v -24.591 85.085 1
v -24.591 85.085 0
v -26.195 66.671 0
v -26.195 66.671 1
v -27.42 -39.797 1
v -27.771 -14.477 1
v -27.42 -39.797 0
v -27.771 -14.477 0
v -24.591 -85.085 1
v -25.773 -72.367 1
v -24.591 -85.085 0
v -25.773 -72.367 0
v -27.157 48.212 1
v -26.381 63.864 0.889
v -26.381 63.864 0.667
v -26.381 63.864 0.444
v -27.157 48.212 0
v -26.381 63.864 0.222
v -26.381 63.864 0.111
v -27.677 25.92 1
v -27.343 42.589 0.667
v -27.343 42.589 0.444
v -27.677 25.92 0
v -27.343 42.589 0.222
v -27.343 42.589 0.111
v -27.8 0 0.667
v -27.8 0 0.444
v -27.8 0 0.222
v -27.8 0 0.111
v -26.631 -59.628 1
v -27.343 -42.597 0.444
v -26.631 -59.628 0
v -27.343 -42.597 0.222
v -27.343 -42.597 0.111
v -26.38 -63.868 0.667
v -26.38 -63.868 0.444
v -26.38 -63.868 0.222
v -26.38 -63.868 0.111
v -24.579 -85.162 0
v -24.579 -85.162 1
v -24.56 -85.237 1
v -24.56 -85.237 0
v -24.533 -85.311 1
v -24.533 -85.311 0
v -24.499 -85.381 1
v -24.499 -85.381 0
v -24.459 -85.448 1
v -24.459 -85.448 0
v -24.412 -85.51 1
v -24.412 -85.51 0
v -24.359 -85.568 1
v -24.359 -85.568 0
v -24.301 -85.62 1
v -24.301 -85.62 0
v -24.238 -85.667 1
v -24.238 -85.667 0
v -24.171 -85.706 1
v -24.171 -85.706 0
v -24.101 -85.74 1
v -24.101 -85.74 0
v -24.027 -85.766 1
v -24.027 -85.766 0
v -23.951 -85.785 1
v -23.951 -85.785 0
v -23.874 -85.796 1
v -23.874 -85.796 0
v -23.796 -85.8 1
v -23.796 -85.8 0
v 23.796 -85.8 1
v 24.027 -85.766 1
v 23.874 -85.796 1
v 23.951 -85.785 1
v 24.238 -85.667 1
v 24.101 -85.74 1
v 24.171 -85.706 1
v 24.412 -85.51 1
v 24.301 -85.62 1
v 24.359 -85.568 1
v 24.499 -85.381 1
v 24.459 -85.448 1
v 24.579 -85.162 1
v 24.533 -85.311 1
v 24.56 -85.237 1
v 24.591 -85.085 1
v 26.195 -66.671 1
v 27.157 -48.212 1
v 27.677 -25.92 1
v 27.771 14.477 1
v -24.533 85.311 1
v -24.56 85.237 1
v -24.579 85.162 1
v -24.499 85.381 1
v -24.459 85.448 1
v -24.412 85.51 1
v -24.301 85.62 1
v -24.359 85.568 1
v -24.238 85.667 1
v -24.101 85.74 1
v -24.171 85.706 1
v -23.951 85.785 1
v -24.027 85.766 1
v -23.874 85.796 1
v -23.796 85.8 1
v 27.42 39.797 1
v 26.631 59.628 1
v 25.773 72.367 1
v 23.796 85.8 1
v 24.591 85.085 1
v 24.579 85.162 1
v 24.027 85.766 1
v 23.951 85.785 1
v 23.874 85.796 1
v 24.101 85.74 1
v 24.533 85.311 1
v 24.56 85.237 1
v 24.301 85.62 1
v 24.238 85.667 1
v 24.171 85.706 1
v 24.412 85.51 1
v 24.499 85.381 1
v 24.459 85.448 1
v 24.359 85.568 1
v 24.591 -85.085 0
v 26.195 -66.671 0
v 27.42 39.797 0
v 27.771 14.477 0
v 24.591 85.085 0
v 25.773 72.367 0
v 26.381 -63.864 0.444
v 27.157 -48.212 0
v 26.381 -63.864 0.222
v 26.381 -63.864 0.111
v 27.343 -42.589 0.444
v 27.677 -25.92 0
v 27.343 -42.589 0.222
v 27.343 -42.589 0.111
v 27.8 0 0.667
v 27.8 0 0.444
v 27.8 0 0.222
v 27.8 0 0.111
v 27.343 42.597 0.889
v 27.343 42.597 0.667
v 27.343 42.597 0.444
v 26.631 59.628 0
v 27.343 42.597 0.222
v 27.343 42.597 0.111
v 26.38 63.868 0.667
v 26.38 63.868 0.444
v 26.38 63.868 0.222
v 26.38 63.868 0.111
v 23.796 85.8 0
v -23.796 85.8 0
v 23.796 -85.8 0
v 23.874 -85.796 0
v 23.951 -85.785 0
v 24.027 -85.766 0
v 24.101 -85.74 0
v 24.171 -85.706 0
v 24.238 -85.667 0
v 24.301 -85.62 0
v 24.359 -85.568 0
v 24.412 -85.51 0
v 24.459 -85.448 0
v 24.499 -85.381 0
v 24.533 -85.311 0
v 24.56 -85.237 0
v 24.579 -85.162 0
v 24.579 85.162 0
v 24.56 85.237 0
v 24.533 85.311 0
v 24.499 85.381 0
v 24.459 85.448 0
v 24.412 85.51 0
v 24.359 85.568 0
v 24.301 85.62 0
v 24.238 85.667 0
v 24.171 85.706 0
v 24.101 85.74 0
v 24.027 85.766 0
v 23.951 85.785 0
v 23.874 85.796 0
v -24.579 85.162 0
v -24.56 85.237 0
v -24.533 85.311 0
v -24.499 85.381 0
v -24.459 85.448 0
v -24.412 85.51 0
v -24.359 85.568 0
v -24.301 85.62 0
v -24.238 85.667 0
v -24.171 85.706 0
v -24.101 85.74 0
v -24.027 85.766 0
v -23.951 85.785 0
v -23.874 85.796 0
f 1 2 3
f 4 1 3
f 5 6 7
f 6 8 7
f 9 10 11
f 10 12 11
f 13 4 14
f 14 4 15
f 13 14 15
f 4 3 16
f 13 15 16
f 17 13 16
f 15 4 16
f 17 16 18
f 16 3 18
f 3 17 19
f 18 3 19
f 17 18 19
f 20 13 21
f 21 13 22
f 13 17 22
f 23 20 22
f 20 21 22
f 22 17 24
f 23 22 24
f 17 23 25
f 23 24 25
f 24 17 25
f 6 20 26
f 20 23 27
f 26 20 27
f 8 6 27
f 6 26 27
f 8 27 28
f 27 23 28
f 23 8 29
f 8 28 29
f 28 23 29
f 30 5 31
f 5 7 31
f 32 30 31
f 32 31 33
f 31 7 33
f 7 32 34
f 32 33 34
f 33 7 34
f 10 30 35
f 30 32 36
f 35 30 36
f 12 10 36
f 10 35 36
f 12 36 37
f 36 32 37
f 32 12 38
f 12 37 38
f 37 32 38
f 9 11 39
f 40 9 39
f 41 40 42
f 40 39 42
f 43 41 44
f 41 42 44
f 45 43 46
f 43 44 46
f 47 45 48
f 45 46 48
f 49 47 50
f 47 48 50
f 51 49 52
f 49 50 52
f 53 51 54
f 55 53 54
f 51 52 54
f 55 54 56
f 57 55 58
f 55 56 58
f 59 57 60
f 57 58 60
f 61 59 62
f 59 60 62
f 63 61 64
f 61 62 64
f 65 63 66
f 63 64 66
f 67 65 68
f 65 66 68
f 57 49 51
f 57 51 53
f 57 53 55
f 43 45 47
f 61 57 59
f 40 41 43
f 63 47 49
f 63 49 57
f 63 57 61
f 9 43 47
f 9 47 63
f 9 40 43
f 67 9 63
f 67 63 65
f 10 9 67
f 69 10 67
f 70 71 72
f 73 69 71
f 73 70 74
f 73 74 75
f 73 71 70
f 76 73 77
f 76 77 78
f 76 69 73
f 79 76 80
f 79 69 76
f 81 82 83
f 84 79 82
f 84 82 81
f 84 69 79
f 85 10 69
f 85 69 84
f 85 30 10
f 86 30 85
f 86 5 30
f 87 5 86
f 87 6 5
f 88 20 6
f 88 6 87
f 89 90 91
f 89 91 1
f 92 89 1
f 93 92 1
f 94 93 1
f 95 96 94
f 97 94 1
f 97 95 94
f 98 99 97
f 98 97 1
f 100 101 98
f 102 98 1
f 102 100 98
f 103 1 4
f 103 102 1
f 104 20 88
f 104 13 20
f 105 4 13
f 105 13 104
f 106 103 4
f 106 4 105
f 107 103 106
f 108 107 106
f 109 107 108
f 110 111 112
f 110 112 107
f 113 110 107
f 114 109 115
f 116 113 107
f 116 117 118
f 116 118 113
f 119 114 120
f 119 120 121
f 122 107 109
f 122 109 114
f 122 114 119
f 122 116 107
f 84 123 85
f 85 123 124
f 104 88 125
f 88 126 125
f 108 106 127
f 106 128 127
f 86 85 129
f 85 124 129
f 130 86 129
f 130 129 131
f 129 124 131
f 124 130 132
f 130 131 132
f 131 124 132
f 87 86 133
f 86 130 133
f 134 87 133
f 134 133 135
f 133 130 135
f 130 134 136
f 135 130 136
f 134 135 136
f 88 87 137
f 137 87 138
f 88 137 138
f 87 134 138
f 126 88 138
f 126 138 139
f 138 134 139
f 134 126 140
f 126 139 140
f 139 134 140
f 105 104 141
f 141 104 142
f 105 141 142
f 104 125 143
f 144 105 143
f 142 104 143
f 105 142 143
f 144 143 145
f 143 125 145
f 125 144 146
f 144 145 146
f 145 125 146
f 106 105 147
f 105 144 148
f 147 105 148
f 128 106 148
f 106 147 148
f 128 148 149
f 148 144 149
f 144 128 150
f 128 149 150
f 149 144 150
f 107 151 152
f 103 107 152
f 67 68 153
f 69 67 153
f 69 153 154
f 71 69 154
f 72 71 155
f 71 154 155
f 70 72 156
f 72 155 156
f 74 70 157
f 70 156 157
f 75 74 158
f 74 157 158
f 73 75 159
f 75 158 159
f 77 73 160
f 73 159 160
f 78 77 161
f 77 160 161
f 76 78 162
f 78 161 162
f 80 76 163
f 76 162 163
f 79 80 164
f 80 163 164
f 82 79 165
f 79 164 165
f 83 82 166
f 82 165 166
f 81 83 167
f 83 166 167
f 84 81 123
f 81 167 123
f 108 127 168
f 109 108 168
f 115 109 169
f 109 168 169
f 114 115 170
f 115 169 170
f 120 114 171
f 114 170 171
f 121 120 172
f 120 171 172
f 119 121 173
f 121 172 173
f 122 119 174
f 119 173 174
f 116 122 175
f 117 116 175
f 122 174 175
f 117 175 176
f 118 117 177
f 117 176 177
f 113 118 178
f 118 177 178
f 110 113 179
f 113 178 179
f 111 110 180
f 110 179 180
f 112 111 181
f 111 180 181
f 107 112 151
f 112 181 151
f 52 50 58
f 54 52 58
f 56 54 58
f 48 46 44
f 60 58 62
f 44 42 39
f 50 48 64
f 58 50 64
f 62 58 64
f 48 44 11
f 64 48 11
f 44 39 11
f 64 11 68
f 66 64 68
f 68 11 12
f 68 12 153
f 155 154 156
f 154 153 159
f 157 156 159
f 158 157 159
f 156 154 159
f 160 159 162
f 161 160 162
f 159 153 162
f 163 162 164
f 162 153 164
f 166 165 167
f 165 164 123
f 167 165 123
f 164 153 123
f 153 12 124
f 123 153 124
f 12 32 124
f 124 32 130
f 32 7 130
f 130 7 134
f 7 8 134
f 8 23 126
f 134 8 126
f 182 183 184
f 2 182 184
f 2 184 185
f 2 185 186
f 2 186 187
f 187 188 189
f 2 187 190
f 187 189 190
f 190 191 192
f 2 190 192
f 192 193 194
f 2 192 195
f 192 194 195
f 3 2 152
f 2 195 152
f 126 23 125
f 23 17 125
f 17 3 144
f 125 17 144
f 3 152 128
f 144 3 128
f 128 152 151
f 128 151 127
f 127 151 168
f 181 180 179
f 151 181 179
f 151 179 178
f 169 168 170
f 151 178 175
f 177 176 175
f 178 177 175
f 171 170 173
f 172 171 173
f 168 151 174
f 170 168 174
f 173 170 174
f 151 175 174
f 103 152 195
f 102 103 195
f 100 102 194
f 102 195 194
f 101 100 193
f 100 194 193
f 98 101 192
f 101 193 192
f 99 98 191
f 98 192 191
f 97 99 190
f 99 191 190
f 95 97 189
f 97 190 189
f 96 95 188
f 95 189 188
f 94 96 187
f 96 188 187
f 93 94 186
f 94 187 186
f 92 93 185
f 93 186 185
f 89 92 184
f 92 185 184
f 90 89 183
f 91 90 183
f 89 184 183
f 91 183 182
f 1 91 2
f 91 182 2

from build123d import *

# Parameters (mm, degrees)
BOSS_EXTRUDE1_DEPTH = 1


with BuildPart() as part:
    # Sketch1 → Boss-Extrude1 (new body)
    with BuildSketch(Plane.XY):
        with BuildLine():
            Line((-23.795886894, -85.79999998), (23.795886554, -85.8))
            ThreePointArc((23.795886554, -85.8), (24.330859001, -85.594814662), (24.59141021, -85.084511206))
            add(Edge.make_bspline(
                [(24.59141021, -85.084511206), (25.341468128, -78.024041397), (25.932408266, -70.950161412), (26.828664767, -56.778329557), (27.135080896, -49.685975803), (27.551790648, -35.492442071), (27.662965311, -28.394595165), (27.787446712, -14.197895926), (27.8, -7.09901507), (27.8, 0)],
                knots=[0, 0, 0, 0, 0.25, 0.25, 0.5, 0.5, 0.75, 0.75, 1, 1, 1, 1], degree=3))
            add(Edge.make_bspline(
                [(27.8, 0), (27.8, 7.100263374), (27.787445727, 14.200482559), (27.66289227, 28.400570909), (27.551614497, 35.499737802), (27.134760595, 49.694574965), (26.827273573, 56.785620292), (26.155946103, 67.408536005), (25.897541639, 70.947263524), (25.302724282, 78.019662606), (24.966538048, 81.553348858), (24.59141053, 85.084511211)],
                knots=[0, 0, 0, 0, 0.25, 0.25, 0.5, 0.5, 0.75, 0.75, 0.875, 0.875, 1, 1, 1, 1], degree=3))
            ThreePointArc((24.59141053, 85.084511211), (24.330859338, 85.594814664), (23.795886894, 85.79999998))
            Line((23.795886894, 85.79999998), (-23.795886554, 85.800000019))
            ThreePointArc((-23.795886554, 85.800000019), (-24.330859013, 85.594814676), (-24.59141021, 85.084511206))
            add(Edge.make_bspline(
                [(-24.59141021, 85.084511206), (-25.341468128, 78.024041397), (-25.932408265, 70.950161412), (-26.828664767, 56.778329556), (-27.135080896, 49.685975803), (-27.551790648, 35.492442071), (-27.662965311, 28.394595165), (-27.787446711, 14.197895926), (-27.8, 7.09901507), (-27.8, 0)],
                knots=[0, 0, 0, 0, 0.25, 0.25, 0.5, 0.5, 0.75, 0.75, 1, 1, 1, 1], degree=3))
            add(Edge.make_bspline(
                [(-27.8, 0), (-27.8, -7.100263374), (-27.787445727, -14.200482559), (-27.66289227, -28.400570909), (-27.551614497, -35.499737802), (-27.134760595, -49.694574965), (-26.827273573, -56.785620292), (-26.155946103, -67.408536005), (-25.897541639, -70.947263524), (-25.302724282, -78.019662606), (-24.966538048, -81.553348858), (-24.59141053, -85.084511211)],
                knots=[0, 0, 0, 0, 0.25, 0.25, 0.5, 0.5, 0.75, 0.75, 0.875, 0.875, 1, 1, 1, 1], degree=3))
            ThreePointArc((-24.59141053, -85.084511211), (-24.330859338, -85.594814664), (-23.795886894, -85.79999998))
        make_face()
    extrude(amount=BOSS_EXTRUDE1_DEPTH)


solid = part.part
